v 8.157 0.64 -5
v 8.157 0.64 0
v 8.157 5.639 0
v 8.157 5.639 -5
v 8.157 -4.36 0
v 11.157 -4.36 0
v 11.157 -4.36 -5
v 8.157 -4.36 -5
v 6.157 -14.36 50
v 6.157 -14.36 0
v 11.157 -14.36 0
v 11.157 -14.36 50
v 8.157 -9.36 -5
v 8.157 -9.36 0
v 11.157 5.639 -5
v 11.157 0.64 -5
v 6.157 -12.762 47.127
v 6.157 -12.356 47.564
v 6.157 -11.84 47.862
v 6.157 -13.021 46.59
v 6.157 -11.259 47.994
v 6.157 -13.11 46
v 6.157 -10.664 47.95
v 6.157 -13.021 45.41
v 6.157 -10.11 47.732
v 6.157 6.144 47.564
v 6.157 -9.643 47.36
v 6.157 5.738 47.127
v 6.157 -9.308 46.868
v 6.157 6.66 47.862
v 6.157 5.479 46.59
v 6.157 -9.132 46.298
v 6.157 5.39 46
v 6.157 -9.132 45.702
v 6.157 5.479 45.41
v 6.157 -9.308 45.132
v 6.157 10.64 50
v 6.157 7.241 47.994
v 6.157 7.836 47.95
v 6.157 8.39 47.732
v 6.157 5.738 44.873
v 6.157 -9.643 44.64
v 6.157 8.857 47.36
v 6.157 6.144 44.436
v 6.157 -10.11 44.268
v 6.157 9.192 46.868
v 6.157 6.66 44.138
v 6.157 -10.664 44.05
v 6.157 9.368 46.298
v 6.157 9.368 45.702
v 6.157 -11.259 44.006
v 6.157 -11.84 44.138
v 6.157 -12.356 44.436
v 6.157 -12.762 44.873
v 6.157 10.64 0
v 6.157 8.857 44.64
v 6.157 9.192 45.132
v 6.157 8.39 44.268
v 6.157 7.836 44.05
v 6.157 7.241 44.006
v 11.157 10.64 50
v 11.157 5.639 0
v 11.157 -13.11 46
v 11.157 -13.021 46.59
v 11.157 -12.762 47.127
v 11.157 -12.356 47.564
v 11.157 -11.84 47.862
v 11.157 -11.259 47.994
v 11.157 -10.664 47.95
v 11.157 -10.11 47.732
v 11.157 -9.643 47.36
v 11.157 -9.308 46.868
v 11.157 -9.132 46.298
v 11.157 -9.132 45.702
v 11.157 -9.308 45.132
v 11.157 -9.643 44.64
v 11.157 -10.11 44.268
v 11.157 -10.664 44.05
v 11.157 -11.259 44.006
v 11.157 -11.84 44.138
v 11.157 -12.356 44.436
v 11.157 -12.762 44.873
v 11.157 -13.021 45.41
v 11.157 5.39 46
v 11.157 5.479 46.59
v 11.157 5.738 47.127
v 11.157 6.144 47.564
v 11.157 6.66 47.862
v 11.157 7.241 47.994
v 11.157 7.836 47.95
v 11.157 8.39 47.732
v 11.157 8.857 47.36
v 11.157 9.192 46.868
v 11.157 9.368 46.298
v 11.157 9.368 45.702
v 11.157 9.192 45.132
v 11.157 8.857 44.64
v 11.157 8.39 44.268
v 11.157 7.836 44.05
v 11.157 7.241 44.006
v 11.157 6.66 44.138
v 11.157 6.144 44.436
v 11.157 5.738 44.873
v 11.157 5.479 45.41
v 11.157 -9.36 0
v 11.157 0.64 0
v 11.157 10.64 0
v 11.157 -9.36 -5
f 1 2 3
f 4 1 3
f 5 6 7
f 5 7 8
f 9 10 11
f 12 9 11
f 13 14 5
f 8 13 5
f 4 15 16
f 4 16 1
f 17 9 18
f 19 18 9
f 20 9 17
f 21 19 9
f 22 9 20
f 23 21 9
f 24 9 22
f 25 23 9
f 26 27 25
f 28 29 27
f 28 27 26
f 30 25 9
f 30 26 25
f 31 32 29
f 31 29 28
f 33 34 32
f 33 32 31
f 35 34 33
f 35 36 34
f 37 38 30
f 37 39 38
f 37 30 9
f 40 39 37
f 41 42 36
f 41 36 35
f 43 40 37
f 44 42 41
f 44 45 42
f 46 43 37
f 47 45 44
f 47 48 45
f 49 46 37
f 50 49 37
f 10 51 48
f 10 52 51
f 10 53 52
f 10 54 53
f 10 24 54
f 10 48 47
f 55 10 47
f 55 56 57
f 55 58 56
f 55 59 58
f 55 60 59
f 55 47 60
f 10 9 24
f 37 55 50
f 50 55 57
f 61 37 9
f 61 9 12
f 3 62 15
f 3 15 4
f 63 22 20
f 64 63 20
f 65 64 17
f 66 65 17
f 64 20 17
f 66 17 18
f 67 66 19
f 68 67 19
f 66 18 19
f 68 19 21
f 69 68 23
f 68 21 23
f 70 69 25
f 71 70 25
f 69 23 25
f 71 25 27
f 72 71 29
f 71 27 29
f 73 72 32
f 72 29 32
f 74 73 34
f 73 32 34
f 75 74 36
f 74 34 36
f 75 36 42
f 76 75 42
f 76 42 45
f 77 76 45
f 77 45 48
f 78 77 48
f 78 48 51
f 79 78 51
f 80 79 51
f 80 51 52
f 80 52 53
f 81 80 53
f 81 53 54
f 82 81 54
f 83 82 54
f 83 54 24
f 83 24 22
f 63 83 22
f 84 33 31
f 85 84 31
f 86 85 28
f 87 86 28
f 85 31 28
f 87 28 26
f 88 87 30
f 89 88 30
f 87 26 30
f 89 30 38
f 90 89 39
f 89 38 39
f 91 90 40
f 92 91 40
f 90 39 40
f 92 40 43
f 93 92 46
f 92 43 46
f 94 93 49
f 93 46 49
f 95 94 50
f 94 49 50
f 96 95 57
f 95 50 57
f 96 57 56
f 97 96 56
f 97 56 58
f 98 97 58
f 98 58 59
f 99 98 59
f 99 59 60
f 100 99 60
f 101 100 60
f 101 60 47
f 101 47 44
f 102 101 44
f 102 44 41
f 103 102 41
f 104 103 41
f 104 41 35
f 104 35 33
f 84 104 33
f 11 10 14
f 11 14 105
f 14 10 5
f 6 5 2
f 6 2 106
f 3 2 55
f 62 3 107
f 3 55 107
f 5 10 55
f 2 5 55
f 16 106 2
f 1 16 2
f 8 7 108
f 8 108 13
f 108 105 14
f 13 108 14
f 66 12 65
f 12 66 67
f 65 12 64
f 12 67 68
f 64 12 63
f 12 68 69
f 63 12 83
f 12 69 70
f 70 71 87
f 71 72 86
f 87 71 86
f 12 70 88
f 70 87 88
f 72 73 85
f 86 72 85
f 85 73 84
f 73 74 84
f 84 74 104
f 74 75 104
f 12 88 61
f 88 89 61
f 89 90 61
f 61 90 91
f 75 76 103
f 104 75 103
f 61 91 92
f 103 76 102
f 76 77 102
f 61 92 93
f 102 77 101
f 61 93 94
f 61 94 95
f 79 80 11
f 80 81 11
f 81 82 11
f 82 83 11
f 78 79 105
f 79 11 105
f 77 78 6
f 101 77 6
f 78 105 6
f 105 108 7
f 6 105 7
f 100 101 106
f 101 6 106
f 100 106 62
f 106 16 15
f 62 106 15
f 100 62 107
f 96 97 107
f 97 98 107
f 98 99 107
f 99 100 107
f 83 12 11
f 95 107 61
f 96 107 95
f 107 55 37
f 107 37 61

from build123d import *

# Parameters (mm, degrees)
SKETCH1_W           = 5
SKETCH1_H           = 25
BOSS_EXTRUDE1_DEPTH = 50
SKETCH2_R           = 2
CUT_EXTRUDE1_DEPTH  = 15
SKETCH3_W           = 3
SKETCH3_H           = 4.998554169
SKETCH3_H_2         = 5
BOSS_EXTRUDE2_DEPTH = 5


with BuildPart() as part:
    # Sketch1 → Boss-Extrude1 (new body)
    with BuildSketch(Plane.XY):
        with Locations((8.657024793, -1.859504132)):
            Rectangle(SKETCH1_W, SKETCH1_H)
    extrude(amount=BOSS_EXTRUDE1_DEPTH)

    # Sketch2 → Cut-Extrude1 (cut)
    with BuildSketch(Plane.ZY.offset(-6.157024793)):
        with Locations(Location((46, -11.109504132, 0), (0, 0, 270))):
            Circle(SKETCH2_R)
        with Locations(Location((46, 7.390495868, 0), (0, 0, 270))):
            Circle(SKETCH2_R)
    extrude(amount=-CUT_EXTRUDE1_DEPTH, mode=Mode.SUBTRACT)

    # Sketch3 → Boss-Extrude2 (add)
    with BuildSketch(Plane(origin=(0, 0, 0), x_dir=(-1, 0, 0), z_dir=(0, 0, -1))):
        with Locations((-9.657024793, 3.139772953)):
            Rectangle(SKETCH3_W, SKETCH3_H)
        with Locations((-9.657024793, -6.859504132)):
            Rectangle(SKETCH3_W, SKETCH3_H_2)
    extrude(amount=BOSS_EXTRUDE2_DEPTH)


solid = part.part
